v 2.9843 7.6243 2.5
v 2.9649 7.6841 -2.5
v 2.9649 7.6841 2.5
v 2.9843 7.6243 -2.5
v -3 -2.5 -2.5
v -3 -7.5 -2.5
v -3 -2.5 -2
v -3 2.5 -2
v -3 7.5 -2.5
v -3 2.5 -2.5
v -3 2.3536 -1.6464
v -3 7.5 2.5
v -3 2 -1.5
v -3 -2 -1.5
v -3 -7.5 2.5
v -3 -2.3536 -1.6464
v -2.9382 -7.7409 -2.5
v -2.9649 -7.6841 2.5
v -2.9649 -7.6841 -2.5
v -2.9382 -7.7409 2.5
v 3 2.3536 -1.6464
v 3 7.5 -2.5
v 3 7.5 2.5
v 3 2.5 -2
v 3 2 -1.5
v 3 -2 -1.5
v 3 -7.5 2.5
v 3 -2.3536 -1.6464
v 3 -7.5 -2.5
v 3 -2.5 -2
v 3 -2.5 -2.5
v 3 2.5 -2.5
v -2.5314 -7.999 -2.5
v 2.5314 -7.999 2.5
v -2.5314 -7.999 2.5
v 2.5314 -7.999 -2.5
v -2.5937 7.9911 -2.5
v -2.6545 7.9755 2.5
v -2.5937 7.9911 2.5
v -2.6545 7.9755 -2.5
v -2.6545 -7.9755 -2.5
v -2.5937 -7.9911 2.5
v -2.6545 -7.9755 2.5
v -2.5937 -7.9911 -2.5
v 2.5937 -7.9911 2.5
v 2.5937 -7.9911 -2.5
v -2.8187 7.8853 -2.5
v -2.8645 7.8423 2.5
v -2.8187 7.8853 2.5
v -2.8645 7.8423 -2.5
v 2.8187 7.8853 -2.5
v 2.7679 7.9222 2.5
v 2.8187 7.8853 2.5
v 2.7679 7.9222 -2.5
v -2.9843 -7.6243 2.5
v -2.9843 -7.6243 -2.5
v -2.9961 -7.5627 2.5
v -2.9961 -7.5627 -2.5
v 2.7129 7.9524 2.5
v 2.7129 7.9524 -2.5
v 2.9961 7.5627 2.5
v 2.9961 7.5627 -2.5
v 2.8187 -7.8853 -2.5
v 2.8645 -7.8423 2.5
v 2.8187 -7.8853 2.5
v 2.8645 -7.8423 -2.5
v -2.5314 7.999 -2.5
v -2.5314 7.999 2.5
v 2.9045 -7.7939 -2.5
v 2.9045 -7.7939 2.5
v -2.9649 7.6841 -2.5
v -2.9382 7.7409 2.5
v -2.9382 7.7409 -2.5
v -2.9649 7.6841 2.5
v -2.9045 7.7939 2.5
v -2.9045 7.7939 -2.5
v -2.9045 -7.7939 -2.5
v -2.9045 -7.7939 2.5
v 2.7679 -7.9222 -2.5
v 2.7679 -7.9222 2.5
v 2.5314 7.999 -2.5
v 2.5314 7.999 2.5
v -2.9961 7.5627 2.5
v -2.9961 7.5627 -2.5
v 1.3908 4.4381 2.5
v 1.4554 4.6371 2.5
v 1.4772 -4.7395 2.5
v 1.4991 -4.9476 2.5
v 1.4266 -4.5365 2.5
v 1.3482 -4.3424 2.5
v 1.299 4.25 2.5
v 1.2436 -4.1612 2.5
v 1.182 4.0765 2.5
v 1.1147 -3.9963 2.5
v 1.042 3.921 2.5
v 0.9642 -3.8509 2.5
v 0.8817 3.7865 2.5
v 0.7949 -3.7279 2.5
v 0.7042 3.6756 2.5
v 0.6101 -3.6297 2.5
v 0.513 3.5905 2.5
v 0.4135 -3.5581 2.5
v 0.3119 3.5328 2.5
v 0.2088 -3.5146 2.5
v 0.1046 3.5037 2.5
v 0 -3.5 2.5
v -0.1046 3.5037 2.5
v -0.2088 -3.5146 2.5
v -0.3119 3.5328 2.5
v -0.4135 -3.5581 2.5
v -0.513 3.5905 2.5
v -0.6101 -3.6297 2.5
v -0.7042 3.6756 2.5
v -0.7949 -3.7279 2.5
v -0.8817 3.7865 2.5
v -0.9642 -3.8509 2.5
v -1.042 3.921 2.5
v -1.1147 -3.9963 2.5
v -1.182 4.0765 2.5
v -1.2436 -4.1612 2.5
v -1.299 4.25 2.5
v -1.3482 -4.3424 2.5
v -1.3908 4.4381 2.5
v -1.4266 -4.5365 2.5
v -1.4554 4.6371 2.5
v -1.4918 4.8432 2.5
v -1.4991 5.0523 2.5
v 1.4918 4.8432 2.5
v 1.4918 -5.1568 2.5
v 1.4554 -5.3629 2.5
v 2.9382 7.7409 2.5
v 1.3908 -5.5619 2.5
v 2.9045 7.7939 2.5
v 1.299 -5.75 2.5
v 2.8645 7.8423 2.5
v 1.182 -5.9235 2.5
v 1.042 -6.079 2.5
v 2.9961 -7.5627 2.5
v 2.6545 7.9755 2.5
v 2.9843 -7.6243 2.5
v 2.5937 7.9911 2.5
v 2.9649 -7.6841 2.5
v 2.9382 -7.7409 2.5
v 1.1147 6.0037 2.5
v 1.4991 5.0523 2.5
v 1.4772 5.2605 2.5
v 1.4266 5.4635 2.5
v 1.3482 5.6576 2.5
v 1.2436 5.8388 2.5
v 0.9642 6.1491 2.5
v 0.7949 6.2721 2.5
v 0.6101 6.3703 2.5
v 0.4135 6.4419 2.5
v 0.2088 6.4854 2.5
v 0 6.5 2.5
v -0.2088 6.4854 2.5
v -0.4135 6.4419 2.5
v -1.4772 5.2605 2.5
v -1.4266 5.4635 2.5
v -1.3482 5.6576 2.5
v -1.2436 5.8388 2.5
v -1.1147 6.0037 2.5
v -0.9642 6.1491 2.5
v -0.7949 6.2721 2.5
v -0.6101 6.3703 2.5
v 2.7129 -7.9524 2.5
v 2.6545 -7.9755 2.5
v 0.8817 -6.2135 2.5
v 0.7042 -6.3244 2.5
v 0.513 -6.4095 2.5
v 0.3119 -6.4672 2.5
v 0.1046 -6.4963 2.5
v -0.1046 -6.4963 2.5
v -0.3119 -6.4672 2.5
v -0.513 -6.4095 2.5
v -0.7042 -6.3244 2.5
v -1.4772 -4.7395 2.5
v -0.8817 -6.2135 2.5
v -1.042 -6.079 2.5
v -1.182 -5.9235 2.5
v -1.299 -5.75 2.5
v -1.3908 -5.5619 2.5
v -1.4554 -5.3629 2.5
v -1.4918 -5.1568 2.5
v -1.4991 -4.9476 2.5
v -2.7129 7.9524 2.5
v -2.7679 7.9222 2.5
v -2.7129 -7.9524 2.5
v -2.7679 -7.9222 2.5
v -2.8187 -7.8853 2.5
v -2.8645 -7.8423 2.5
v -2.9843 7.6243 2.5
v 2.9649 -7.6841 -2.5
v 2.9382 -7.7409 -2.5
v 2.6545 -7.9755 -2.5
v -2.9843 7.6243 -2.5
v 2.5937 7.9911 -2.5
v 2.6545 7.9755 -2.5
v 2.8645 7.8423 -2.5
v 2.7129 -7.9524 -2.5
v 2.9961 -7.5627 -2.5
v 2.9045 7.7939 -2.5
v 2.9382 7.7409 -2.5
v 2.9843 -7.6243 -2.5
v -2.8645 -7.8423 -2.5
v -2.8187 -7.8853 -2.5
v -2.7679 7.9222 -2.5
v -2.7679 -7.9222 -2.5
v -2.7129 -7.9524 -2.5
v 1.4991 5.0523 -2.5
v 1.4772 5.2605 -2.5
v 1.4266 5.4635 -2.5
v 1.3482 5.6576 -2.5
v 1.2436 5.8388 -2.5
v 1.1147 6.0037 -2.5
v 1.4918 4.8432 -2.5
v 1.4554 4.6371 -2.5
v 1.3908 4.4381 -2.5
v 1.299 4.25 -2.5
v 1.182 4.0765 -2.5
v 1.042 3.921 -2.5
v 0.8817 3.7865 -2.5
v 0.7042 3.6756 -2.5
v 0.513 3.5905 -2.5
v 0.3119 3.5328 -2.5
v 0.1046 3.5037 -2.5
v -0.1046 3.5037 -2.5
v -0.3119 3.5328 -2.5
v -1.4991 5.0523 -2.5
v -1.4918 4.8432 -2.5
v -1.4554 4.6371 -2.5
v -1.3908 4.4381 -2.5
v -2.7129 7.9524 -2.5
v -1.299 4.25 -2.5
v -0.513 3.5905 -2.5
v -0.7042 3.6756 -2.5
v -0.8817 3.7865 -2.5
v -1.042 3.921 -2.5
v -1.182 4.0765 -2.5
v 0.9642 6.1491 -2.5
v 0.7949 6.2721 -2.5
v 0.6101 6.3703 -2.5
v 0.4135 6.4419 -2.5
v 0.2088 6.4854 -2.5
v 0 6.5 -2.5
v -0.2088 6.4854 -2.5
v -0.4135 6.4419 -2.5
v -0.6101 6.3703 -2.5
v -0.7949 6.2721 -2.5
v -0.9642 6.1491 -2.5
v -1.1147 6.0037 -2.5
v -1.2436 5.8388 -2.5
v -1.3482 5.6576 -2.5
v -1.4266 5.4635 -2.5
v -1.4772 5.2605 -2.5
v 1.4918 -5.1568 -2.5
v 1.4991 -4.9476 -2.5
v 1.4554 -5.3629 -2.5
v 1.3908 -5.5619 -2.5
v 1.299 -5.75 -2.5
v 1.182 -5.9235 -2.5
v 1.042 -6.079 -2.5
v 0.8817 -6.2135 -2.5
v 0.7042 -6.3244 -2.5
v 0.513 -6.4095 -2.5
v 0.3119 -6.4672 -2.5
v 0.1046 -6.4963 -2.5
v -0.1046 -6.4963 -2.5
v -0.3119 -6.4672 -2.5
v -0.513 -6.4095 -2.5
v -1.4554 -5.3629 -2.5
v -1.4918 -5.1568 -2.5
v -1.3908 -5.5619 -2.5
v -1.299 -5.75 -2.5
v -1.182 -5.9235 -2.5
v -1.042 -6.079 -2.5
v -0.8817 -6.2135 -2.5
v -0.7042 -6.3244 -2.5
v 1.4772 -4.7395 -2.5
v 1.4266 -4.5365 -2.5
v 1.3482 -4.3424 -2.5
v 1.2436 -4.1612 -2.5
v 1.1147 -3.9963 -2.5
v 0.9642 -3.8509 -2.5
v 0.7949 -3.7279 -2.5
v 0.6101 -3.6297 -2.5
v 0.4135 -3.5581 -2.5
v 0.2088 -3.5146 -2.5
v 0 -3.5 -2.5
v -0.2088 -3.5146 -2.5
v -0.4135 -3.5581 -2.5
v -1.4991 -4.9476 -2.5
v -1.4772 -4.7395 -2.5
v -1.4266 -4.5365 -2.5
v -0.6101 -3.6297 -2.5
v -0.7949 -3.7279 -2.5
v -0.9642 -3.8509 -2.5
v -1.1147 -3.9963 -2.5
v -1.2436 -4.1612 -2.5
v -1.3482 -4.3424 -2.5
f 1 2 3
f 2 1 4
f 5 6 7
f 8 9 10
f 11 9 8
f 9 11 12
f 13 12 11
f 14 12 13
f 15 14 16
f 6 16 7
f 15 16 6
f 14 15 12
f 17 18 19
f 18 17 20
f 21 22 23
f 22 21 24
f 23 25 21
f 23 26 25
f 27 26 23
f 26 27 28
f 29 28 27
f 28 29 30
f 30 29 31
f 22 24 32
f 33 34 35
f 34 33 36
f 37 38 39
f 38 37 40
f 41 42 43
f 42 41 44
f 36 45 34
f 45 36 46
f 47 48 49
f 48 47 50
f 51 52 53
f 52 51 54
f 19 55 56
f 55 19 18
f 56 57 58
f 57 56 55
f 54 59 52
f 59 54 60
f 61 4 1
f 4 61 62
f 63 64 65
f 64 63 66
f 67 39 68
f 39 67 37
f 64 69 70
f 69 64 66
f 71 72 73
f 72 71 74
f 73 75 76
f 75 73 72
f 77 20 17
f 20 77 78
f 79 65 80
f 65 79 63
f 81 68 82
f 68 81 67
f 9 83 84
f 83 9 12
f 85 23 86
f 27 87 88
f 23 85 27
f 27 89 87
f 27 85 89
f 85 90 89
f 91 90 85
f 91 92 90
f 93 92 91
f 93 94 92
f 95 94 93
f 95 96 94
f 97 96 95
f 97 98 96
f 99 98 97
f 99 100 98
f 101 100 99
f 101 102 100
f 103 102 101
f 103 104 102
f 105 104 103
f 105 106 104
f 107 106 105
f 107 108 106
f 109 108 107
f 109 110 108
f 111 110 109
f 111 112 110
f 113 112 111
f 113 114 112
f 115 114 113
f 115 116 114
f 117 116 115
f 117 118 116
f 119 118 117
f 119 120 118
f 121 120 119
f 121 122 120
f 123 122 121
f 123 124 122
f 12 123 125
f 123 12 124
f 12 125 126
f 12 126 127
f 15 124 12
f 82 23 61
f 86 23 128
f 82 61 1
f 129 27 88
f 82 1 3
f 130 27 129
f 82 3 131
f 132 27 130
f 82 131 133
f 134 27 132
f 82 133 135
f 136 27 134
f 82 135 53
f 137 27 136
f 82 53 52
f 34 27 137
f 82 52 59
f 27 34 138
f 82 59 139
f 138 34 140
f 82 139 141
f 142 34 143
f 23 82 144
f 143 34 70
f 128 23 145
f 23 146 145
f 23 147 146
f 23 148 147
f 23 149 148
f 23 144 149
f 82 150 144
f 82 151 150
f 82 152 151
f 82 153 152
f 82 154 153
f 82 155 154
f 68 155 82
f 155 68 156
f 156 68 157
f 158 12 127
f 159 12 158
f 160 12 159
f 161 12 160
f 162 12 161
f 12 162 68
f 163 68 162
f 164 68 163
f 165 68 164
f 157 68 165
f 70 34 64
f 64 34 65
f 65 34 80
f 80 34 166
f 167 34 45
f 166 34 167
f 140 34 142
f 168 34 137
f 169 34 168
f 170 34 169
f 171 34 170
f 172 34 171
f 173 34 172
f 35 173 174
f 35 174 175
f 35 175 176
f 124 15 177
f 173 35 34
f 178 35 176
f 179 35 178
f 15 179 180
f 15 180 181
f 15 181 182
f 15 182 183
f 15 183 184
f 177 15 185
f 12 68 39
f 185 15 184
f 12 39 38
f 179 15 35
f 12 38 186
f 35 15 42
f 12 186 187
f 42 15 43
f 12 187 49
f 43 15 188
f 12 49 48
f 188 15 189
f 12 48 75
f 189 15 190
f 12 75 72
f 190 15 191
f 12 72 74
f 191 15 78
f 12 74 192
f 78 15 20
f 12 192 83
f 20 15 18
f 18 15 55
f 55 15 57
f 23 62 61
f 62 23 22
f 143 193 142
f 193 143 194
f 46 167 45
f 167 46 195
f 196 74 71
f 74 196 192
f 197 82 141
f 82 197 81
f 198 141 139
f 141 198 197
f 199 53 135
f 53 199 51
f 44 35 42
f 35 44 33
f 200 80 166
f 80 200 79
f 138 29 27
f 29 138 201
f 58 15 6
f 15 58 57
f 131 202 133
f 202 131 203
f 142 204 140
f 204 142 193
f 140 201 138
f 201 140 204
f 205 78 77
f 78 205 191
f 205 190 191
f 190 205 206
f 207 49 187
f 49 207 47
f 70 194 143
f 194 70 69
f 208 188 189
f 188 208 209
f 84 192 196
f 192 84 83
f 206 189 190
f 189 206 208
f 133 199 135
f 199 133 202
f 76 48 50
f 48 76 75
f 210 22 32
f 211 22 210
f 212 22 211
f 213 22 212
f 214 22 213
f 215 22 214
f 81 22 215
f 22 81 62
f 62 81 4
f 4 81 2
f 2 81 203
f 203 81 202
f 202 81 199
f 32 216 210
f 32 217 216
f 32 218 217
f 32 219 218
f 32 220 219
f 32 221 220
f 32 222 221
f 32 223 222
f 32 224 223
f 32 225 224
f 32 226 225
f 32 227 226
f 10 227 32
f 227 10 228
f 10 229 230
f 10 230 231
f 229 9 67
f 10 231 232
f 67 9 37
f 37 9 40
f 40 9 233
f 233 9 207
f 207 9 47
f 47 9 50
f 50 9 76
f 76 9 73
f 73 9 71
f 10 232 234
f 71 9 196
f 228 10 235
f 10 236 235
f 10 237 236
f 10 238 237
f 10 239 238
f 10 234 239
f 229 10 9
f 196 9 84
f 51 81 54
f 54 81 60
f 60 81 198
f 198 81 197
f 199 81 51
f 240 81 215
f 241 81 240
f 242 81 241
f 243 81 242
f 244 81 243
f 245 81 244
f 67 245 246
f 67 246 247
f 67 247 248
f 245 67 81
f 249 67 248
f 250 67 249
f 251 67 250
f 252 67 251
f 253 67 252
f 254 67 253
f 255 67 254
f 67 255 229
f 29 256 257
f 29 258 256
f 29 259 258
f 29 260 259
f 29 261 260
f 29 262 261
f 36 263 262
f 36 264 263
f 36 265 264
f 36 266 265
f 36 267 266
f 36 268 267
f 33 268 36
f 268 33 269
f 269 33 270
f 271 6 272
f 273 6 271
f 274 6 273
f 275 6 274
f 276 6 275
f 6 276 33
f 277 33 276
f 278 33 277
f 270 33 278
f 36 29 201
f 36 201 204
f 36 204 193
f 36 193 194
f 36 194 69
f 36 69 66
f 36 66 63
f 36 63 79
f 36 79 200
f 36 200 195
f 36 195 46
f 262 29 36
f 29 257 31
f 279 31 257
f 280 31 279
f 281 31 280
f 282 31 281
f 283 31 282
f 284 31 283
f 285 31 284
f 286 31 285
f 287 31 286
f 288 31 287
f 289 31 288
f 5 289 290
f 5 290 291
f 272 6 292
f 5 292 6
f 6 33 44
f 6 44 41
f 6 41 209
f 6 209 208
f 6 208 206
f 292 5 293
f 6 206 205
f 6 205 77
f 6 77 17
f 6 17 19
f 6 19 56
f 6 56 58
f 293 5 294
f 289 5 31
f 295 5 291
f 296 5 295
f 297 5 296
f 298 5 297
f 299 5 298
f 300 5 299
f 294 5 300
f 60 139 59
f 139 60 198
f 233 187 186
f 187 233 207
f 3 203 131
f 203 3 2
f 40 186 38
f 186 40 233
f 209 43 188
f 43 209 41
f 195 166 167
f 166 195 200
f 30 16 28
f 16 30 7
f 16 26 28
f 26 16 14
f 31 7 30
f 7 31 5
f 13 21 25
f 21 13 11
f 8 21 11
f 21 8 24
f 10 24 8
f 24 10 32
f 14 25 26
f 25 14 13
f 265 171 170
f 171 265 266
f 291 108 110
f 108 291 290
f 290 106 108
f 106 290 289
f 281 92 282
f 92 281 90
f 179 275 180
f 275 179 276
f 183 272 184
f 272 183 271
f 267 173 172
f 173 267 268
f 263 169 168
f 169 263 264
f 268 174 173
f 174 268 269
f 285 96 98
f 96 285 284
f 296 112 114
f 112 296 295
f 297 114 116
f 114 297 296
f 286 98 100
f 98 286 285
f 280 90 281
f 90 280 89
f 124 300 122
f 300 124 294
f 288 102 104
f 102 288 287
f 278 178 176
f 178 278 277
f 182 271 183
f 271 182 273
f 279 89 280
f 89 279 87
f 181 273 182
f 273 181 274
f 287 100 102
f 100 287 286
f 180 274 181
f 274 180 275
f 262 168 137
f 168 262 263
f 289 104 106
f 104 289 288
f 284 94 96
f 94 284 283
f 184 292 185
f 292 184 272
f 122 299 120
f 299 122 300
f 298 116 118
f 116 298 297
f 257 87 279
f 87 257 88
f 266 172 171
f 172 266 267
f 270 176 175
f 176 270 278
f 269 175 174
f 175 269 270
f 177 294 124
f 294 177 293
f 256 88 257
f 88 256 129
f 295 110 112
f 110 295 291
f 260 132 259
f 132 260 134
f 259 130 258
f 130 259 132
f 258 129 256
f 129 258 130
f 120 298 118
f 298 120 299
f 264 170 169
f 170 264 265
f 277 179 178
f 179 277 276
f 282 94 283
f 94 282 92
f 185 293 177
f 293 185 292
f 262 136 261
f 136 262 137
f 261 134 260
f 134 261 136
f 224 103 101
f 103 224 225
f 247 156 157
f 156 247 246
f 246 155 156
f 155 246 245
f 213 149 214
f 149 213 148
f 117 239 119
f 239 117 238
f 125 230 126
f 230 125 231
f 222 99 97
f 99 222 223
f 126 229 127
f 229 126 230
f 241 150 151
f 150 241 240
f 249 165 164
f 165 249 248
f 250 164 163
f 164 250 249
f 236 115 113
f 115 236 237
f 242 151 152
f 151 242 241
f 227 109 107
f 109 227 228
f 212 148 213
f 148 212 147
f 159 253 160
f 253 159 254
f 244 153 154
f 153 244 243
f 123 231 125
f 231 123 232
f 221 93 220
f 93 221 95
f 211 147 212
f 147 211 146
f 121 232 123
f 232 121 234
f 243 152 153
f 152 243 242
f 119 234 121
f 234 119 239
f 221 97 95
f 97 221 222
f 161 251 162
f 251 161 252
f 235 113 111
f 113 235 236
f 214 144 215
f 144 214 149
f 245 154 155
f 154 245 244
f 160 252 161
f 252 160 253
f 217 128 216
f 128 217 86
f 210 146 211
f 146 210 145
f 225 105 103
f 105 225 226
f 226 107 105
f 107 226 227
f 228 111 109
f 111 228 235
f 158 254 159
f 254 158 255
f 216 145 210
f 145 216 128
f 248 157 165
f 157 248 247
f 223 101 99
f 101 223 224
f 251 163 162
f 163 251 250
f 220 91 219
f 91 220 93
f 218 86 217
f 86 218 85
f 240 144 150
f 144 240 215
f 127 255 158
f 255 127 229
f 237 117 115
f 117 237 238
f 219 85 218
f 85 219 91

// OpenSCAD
//*** Parametric cable clamp ***
//Bertrand Achard - Creative Common attribution share alike.

//v1.0 (21/12/2012) : Initial release
//v1.1 (24/12/2012) : Adds full-clamp setup (see below)
//v1.2 (25/12/2012) : Added rounded corners (using minkowski)

//The design assumes that the diameter of the screws is smaller than the cable.

//Two possible setups :
//
//1) Half-clamp (you can join 2 together to hold the cable)
//Factor 1.1 = presses the cable by 10%
//cable_press=cable_diam*0.5*1.1;
//cube_z=cable_diam*1.5;
//
//2) Full-clamp (you can screw the clamp to a flat surface)
//Factor 0.1 = presses the cable by 10%
//cable_press=cable_diam*0.1;
//cube_z=cable_diam*2.5;

//Diameter of the cable
cable_diam=4;
//Diameter of the 2 screws
screw_diam=3;

cable_height=1.5;

//The height of the cube (z axis)
cube_z=cable_diam*2.5;
//The depth of the cube (x axis), min=screw_diam+some margin
cube_x=screw_diam*4;
//The width of the cube (y axis), min=6
cube_y=cable_diam*8;

//Do not set this to 0, or remove the minkowski.
//Setting this to 0 will remove the cylinder in the minkowski, disabling it, and
//the corrections used for the minkowski will introduce an error.
cube_roundness=cable_diam/4;

difference()
{
	//-0.5 in translate and -1 in cube Z corrects for the error added by minkowski with cylinder h=1.
	translate([0,0,-0.5]) minkowski()
	{
		cube([cube_x/2-cube_roundness,cube_y/2-cube_roundness,cube_z/2-1], true);
		cylinder(r=cube_roundness/2,h=1,$fn=50);
	}


	translate([0,0,-cube_z/2+2+cable_height]) union() {
                hull() {
                       translate([0, cable_diam/2, -.5]) rotate([0,90,0]) cylinder(h=cube_x+1, d = 1, center = true, $fn = 8);
                       translate([0, -cable_diam/2, -.5]) rotate([0,90,0]) cylinder(h=cube_x+1, d = 1, center = true, $fn = 8);
                       translate([0, cable_diam/2, -2]) rotate([0,90,0]) cylinder(h=cube_x+1, d = 1, center = true, $fn = 8);
                       translate([0, -cable_diam/2, -2]) rotate([0,90,0]) cylinder(h=cube_x+1, d = 1, center = true, $fn = 8);
                }
	}

        // Screw holes
	translate([0,-cube_y/8-cable_diam/4,0])
		rotate([0,0,90])
			cylinder(h=cube_z, r1=screw_diam/2, r2=screw_diam/2, center=true, $fn=screw_diam*15);

	translate([0,cube_y/8+cable_diam/4,0])
		rotate([0,0,90])
			cylinder(h=cube_z, r1=screw_diam/2, r2=screw_diam/2, center=true, $fn=screw_diam*15);
}
